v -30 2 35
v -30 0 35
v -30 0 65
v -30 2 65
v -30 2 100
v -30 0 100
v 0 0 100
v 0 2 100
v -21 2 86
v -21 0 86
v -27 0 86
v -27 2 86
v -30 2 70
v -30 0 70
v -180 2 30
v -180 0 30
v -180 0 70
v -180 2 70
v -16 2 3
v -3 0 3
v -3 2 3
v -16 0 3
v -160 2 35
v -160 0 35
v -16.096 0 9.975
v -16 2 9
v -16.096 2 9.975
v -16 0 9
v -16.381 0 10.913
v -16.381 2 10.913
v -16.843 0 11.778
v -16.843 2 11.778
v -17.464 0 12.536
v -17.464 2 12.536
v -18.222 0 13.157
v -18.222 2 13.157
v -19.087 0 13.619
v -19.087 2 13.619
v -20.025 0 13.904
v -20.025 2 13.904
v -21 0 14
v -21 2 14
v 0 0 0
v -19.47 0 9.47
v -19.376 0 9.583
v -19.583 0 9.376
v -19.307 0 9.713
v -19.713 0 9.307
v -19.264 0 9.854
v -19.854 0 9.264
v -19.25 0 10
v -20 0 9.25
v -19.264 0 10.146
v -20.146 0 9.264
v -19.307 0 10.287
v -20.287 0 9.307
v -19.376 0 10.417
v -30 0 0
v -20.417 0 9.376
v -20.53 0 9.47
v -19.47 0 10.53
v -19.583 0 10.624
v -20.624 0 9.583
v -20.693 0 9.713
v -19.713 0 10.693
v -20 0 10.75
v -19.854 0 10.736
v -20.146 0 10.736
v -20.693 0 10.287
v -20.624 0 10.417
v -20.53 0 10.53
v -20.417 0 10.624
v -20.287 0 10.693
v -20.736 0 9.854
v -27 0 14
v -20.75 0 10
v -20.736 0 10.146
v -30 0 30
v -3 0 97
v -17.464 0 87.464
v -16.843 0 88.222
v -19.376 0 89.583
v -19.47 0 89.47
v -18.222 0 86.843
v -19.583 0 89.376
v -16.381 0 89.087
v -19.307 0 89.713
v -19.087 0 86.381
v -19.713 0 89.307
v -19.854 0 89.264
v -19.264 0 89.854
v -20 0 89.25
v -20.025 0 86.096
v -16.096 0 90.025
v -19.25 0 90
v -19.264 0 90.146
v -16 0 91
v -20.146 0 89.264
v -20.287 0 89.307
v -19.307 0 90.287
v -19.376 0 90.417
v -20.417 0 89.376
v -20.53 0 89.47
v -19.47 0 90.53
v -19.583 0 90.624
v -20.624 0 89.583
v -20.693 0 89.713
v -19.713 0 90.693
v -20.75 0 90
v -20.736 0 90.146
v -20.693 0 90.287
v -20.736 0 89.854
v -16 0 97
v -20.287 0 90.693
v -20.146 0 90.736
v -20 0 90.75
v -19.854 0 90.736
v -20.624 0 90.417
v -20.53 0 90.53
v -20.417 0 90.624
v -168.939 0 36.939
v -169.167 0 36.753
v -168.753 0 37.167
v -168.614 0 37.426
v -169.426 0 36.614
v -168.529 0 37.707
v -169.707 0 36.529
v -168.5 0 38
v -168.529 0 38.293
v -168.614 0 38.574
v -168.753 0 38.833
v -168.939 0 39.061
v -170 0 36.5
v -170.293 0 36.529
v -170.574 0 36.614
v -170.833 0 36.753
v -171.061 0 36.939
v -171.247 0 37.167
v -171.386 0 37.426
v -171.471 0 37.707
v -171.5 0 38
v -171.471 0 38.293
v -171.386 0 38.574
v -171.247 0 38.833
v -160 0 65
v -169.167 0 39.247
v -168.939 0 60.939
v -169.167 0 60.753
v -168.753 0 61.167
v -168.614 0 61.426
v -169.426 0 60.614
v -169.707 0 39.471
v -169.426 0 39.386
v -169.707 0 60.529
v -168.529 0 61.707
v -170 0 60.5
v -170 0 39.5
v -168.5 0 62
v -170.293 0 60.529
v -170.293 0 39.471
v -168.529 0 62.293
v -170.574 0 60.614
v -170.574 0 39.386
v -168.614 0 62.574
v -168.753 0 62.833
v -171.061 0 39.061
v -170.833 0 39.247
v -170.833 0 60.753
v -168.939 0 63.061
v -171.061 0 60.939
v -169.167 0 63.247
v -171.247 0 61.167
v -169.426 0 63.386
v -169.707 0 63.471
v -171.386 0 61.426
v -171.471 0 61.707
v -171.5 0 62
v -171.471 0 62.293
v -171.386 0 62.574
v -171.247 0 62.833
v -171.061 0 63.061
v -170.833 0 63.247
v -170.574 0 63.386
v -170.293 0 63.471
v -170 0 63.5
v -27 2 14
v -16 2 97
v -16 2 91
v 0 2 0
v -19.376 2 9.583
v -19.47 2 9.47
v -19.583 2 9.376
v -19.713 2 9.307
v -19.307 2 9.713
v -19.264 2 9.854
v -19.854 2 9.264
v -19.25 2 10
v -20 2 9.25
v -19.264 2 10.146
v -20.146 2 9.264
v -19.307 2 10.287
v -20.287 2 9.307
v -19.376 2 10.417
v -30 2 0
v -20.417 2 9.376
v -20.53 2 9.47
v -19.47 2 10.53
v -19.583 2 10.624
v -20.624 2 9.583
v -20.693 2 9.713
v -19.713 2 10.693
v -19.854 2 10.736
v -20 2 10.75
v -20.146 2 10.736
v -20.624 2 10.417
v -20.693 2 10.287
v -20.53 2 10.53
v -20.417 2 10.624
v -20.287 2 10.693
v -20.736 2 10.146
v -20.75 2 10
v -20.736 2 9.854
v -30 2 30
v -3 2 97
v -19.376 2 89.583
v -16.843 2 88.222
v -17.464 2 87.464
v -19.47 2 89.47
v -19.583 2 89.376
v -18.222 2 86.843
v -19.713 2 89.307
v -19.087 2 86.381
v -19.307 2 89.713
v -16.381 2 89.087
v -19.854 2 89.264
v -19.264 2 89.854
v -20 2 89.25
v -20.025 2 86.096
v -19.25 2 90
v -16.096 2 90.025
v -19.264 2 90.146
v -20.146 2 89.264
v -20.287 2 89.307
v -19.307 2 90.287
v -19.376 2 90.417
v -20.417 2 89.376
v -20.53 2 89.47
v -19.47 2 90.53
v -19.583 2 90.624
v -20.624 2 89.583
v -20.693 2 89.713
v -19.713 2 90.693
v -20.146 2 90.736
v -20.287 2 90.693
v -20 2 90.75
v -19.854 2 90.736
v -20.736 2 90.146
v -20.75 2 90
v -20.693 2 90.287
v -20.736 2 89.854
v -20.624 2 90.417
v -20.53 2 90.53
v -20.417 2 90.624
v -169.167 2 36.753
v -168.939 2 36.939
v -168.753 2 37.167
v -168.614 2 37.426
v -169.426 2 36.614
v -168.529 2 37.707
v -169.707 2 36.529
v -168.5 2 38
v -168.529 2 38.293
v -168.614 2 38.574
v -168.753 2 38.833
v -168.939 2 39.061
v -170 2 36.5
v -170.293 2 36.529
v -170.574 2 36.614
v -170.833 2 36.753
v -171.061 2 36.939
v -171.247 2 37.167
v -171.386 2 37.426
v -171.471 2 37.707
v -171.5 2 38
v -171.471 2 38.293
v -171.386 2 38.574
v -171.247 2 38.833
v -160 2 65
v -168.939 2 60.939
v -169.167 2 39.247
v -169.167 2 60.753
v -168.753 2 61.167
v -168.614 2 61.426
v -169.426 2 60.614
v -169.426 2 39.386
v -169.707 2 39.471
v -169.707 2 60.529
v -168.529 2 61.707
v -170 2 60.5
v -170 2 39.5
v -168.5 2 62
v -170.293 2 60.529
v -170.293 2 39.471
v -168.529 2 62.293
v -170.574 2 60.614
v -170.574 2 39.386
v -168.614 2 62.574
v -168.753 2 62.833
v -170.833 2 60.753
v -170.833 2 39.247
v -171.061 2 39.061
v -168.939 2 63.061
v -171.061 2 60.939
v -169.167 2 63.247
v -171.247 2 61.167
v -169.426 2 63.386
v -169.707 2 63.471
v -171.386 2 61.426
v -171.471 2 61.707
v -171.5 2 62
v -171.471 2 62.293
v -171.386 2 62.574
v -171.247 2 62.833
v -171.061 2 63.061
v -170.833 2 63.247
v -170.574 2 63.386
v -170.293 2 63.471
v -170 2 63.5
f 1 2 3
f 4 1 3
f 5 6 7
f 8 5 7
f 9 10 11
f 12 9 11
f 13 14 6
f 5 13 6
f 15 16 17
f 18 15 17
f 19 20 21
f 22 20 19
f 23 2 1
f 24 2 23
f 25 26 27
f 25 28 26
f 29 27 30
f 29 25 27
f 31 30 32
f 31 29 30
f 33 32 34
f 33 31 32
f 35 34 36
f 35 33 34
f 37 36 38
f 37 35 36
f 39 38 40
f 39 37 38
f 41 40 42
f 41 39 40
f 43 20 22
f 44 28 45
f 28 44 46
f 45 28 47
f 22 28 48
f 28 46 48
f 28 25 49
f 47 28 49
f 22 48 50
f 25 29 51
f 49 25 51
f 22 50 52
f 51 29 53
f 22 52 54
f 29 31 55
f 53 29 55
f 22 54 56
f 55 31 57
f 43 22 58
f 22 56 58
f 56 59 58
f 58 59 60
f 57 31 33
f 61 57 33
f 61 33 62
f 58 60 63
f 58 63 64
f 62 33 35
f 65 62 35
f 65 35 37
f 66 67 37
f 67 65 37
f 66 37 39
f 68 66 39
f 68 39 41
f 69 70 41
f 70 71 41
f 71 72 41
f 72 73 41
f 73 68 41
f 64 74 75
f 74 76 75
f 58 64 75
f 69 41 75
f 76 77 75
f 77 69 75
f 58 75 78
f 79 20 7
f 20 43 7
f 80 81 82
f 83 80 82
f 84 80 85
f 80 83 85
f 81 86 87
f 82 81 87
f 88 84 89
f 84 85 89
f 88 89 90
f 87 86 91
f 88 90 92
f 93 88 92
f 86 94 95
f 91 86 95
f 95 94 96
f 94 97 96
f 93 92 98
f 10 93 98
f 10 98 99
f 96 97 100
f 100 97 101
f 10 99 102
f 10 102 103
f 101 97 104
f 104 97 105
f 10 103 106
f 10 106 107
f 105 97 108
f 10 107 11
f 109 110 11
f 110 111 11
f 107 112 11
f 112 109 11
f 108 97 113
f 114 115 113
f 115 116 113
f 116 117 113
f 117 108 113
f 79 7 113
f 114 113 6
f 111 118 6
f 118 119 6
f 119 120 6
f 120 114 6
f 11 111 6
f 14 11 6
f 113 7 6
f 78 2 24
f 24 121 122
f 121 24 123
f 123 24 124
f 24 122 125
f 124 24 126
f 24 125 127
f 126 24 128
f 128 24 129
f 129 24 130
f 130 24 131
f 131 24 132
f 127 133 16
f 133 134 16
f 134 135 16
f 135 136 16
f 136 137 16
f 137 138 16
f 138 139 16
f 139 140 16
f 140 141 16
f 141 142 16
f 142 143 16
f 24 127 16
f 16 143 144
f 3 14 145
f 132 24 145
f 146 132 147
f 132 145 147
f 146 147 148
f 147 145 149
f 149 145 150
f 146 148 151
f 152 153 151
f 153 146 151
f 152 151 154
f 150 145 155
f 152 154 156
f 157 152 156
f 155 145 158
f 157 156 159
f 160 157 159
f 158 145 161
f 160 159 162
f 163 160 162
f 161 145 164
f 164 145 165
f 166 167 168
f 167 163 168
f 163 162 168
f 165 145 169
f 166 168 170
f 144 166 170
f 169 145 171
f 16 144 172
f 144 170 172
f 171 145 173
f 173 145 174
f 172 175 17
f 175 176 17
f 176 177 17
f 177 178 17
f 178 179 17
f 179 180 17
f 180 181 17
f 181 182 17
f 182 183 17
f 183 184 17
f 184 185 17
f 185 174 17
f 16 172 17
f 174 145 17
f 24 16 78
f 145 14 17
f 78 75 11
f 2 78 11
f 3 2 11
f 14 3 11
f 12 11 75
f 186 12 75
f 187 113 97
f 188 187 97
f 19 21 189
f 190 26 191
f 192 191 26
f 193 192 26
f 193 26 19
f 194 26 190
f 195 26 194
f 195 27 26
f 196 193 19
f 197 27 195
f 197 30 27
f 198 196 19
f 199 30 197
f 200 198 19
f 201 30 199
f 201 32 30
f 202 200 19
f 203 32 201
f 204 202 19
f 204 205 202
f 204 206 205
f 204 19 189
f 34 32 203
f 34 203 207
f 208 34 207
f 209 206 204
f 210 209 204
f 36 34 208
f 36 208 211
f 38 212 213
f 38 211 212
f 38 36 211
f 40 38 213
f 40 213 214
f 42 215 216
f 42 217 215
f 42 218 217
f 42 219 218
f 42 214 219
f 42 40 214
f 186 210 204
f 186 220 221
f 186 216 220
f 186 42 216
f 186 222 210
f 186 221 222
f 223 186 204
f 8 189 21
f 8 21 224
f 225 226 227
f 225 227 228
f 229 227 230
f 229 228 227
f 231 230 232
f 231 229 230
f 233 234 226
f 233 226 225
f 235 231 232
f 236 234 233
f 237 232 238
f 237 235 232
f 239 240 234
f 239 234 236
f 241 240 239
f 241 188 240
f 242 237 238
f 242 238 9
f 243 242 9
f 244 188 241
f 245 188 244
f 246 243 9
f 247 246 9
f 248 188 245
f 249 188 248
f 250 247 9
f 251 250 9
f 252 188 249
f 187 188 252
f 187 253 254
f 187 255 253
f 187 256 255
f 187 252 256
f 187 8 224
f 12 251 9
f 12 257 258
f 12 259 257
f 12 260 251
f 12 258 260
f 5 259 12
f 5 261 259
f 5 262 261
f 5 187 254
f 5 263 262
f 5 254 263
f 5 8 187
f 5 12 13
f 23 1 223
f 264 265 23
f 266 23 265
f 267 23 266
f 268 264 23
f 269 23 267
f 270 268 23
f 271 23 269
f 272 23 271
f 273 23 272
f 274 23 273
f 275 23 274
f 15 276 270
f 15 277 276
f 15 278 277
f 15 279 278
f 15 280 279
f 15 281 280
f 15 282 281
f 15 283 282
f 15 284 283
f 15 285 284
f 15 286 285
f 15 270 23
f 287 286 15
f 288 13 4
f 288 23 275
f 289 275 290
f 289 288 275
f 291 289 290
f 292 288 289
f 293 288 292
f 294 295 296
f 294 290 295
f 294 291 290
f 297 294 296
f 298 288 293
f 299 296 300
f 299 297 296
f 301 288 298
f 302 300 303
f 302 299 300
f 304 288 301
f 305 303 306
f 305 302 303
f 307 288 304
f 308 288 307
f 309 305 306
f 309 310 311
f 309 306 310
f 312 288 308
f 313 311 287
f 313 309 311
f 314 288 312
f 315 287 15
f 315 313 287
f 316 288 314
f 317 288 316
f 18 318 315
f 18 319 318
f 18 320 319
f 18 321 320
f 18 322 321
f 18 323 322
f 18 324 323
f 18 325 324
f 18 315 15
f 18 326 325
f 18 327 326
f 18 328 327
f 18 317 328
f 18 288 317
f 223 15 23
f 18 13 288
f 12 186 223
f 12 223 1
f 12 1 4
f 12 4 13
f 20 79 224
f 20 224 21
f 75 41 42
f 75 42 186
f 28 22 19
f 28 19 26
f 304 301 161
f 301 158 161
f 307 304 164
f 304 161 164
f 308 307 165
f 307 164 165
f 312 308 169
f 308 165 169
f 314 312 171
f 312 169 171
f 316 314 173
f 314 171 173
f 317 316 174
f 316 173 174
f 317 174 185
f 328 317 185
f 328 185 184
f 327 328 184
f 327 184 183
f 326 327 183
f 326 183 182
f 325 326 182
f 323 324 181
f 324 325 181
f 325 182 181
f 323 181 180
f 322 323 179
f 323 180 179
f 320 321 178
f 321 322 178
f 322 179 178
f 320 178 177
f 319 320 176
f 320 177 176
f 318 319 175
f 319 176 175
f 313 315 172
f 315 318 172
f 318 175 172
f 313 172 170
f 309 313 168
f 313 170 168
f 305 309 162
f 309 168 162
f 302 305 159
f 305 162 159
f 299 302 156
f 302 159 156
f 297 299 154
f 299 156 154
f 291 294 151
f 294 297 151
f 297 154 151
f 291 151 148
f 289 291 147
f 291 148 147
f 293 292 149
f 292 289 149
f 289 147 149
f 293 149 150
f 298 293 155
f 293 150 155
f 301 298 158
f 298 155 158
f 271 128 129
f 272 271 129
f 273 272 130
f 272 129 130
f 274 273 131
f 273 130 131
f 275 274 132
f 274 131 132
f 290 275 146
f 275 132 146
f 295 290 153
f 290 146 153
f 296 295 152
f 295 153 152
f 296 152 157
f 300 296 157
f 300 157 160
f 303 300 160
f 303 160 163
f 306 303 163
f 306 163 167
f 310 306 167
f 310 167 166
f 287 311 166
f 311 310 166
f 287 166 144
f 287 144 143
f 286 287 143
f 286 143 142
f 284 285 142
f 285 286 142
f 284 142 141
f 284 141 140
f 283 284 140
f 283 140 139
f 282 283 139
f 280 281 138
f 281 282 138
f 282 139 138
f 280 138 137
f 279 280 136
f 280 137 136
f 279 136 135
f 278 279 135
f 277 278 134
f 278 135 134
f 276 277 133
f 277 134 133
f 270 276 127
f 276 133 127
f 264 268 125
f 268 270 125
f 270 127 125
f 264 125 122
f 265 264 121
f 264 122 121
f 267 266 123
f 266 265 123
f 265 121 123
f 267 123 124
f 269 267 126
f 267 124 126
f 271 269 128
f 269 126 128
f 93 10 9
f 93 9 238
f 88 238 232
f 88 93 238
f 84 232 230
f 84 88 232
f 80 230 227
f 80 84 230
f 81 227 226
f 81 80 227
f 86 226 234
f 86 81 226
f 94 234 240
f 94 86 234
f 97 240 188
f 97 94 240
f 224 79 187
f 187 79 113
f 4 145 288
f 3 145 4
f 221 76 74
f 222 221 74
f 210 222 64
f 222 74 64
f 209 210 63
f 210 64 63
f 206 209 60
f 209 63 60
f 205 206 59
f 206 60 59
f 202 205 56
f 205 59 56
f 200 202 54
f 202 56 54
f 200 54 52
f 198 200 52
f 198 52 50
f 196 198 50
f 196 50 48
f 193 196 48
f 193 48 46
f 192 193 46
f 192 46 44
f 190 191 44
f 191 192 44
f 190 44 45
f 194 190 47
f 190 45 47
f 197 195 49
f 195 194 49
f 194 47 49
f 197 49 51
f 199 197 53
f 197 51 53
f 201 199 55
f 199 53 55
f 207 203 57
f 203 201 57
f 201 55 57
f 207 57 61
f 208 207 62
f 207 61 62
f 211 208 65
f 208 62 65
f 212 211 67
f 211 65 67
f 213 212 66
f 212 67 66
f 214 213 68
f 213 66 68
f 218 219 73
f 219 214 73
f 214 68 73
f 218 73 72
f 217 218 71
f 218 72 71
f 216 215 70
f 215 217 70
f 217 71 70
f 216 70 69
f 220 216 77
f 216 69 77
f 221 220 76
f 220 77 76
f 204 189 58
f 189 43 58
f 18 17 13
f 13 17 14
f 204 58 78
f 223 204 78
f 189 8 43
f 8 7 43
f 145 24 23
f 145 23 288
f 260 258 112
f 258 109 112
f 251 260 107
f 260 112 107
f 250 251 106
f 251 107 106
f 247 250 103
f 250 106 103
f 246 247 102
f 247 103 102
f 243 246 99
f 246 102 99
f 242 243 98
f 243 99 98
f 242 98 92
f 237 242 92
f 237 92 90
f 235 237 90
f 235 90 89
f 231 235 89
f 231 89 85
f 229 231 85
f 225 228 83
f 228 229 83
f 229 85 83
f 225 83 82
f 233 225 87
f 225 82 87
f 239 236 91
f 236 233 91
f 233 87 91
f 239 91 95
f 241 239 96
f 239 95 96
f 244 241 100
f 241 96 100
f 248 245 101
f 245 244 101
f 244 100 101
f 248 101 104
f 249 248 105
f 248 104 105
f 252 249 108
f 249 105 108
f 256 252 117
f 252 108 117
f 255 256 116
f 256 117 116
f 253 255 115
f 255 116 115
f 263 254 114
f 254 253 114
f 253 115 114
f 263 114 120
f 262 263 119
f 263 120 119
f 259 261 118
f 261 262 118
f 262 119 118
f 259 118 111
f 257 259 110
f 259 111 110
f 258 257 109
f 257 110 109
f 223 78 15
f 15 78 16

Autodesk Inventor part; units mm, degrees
ref_plane "YZ Plane" through (0, 0, 0) normal (1, 0, 0) x (0, 1, 0)
ref_plane "XZ Plane" through (0, 0, 0) normal (0, 1, 0) x (-1, 0, 0)
ref_plane "XY Plane" through (0, 0, 0) normal (0, 0, 1) x (1, 0, 0)
sketch "Sketch1" plane through (0, 0, 0) normal (0, 1, 0) x (-1, 0, 0)
  line L0 (0, 0) -> (30, 0)
  line L1 (30, 0) -> (30, 100)
  line L2 (30, 100) -> (0, 100)
  line L3 (0, 100) -> (0, 0)
  circle A0 centre (20, 90) radius 0.75
  circle A1 centre (20, 10) radius 0.75
  line L4 (3, 97) -> (3, 3)
  line L5 (30, 100) -> (16, 100)
  line L6 (16, 100) -> (16, 91)
  line L7 (21, 86) -> (30, 86)
  line L8 (30, 86) -> (30, 100)
  line L9 (30, 0) -> (16, 0)
  line L10 (16, 0) -> (16, 9)
  line L11 (21, 14) -> (30, 14)
  line L12 (30, 14) -> (30, 0)
  line L13 (27, 86) -> (27, 14)
  line L14 (3, 97) -> (16, 97)
  line L15 (3, 3) -> (16, 3)
  arc A2 (16, 91) -> (21, 86) centre (21, 91) ccw
  arc A3 (21, 14) -> (16, 9) centre (21, 9) ccw
  point P0 (16, 86)
  point P1 (16, 14)
  dimension "d0" = 30
  dimension "d1" = 100
  dimension "d4" = 94
  dimension "d5" = 14
  dimension "d6" = 14
  dimension "d7" = 14
  dimension "d10" = 5
extrude "Extrusion1" add sketch "Sketch1" along normal blind 2 contours L3 L2 L6 L14 L4 L15 L10 L0 | L10 A3 L11 L1 L0 | L2 L1 L7 A2 L6 | L11 L13 L7 L1
sketch "Sketch2" plane through (0, 2, 0) normal (0, 1, 0) x (1, 0, 0)
  line L0 (-30, 0) -> (-30, -100) projected
  line L1 (-30, -30) -> (-180, -30)
  line L2 (-180, -30) -> (-180, -70)
  line L3 (-180, -70) -> (-30, -70)
  line L4 (-30, -35) -> (-160, -35)
  line L5 (-160, -35) -> (-160, -65)
  line L6 (-160, -65) -> (-30, -65)
  circle A0 centre (-170, -38) radius 1.5
  circle A1 centre (-170, -62) radius 1.5
  point P0 (0, 0)
  point P1 (-180, -38)
  point P2 (-180, -62)
  point P3 (-180, -62)
  dimension "d11" = 130
  dimension "d12" = 30
  dimension "d13" = 3
  dimension "d14" = 3
extrude "Extrusion2" add sketch "Sketch2" along normal blind 2 from surface at -2 contours L0 L4 L5 L6 L3 L2 L1
sketch "Sketch5" plane through (0, 2, 0) normal (0, 1, 0) x (1, 0, 0)
  point P0 (0, 0)
properties part number "druga czesc"
